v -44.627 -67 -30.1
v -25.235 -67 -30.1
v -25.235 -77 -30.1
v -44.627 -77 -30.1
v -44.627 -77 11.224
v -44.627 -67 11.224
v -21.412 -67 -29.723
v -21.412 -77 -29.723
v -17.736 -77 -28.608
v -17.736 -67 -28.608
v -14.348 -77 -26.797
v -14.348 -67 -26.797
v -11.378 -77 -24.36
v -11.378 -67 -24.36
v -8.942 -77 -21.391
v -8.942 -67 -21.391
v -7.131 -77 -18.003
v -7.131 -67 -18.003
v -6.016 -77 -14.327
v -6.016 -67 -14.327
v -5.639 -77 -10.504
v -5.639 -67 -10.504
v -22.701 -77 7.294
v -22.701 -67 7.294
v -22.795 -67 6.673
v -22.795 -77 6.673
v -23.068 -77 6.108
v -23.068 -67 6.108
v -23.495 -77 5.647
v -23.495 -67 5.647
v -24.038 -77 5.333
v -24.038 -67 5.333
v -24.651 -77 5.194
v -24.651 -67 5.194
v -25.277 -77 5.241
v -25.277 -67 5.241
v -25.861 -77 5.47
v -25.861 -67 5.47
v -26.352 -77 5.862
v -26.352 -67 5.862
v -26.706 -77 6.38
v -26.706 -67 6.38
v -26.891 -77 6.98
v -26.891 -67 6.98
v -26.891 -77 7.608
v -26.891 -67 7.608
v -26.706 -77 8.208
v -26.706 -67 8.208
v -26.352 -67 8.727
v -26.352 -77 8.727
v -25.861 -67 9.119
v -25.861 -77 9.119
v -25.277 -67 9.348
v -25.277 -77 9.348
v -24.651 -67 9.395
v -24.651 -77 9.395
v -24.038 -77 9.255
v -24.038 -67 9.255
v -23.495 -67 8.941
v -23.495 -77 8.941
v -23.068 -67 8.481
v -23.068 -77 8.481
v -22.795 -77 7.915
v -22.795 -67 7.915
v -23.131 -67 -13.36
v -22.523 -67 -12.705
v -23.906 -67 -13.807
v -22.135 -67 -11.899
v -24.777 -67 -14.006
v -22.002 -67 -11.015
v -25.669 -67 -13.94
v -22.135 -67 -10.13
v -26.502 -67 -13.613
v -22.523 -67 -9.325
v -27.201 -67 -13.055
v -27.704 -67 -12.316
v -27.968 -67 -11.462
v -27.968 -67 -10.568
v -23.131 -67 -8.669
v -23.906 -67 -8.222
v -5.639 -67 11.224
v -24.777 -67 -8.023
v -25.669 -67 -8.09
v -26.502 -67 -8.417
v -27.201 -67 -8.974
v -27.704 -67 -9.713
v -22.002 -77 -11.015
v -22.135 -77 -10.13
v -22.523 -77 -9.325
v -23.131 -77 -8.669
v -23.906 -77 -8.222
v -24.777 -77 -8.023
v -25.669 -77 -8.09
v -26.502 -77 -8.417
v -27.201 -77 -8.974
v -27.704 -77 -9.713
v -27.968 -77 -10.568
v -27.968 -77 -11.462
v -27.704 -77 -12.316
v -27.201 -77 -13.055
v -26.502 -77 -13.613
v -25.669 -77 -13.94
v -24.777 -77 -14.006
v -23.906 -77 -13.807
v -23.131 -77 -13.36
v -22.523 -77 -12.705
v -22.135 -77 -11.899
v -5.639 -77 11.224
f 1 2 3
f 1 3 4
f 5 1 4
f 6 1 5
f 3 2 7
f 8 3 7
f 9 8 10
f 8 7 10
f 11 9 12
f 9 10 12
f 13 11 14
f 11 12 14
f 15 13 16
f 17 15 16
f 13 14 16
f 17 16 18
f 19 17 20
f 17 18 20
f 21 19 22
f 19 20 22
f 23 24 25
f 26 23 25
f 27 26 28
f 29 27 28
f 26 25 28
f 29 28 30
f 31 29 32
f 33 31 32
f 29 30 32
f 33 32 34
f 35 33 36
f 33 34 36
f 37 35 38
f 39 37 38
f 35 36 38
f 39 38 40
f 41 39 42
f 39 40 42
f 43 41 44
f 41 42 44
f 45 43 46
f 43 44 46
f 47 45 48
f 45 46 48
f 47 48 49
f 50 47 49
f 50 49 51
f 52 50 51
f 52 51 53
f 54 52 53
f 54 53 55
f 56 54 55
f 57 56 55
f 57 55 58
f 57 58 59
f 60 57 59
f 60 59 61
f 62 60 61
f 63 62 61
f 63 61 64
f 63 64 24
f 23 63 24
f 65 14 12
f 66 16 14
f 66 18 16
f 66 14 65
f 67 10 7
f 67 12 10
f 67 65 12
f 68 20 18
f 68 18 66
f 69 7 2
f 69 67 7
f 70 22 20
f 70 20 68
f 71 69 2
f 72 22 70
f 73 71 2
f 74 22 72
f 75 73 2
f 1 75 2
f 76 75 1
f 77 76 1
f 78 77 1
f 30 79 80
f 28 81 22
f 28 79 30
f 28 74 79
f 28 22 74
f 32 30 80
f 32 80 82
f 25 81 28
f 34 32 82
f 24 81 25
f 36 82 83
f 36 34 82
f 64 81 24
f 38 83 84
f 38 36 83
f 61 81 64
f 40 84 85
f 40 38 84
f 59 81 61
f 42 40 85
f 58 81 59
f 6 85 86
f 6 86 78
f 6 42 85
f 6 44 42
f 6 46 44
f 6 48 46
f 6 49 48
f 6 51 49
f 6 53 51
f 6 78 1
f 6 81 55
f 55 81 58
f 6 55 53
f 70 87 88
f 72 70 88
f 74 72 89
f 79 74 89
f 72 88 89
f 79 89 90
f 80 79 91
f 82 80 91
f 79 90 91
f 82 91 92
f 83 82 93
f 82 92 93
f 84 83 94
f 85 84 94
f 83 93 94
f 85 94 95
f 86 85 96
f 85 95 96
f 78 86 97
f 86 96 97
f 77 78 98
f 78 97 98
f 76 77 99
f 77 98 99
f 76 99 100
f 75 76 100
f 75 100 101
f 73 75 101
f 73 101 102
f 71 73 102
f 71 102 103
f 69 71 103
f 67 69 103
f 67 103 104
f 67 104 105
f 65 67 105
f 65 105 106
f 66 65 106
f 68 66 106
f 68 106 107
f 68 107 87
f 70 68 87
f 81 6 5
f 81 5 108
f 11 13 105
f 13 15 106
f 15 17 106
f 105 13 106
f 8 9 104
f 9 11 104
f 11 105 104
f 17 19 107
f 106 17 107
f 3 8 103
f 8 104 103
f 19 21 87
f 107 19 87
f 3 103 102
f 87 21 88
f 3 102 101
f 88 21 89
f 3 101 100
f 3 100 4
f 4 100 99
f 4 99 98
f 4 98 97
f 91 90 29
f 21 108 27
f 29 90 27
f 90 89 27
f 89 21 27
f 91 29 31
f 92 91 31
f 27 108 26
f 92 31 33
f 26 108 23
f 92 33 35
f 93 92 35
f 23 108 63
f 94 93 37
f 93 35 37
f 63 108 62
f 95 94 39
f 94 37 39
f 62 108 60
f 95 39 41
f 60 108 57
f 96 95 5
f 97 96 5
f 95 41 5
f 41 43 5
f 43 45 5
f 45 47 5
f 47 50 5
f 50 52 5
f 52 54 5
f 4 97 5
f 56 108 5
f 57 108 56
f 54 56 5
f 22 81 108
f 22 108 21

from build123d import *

# Parameters (mm, degrees)
PAD006_DEPTH    = 10
SKETCH008_R     = 2.106519
POCKET001_DEPTH = 10.001
SKETCH013_R     = 3
POCKET003_DEPTH = 10.001


with BuildPart() as part:
    # Sketch007 → Pad006 (new body)
    with BuildSketch(Plane.XZ.offset(67)):
        with BuildLine():
            Line((-44.627205, 4.223839), (-5.639042, 4.223839))
            Line((-5.639042, 4.223839), (-5.639042, -17.503959))
            ThreePointArc((-25.234732, -37.099649), (-11.378487, -31.360204), (-5.639042, -17.503959))
            Line((-25.234732, -37.099649), (-44.627205, -37.099649))
            Line((-44.627205, -37.099649), (-44.627205, 4.223839))
        make_face()
    extrude(amount=PAD006_DEPTH)

    # Sketch008 (on Face6 of Pad006) → Pocket001 (cut, through all)
    with BuildSketch(Plane(origin=(0, -67, 1), x_dir=(1, 0, 0), z_dir=(0, 1, 0))):
        with Locations((-24.808006, 0.705665)):
            Circle(SKETCH008_R)
    extrude(amount=-POCKET001_DEPTH, mode=Mode.SUBTRACT)

    # Sketch013 (on Face5 of Pocket001) → Pocket003 (cut, through all)
    with BuildSketch(Plane.XZ.offset(77)):
        with Locations((-25.001532, -18.014723)):
            Circle(SKETCH013_R)
    extrude(amount=-POCKET003_DEPTH, mode=Mode.SUBTRACT)


with BuildPart() as part_1:
    # Body004 placement: moved
    add(part.part.moved(Location((0, 0, 7))))


solid = part_1.part
